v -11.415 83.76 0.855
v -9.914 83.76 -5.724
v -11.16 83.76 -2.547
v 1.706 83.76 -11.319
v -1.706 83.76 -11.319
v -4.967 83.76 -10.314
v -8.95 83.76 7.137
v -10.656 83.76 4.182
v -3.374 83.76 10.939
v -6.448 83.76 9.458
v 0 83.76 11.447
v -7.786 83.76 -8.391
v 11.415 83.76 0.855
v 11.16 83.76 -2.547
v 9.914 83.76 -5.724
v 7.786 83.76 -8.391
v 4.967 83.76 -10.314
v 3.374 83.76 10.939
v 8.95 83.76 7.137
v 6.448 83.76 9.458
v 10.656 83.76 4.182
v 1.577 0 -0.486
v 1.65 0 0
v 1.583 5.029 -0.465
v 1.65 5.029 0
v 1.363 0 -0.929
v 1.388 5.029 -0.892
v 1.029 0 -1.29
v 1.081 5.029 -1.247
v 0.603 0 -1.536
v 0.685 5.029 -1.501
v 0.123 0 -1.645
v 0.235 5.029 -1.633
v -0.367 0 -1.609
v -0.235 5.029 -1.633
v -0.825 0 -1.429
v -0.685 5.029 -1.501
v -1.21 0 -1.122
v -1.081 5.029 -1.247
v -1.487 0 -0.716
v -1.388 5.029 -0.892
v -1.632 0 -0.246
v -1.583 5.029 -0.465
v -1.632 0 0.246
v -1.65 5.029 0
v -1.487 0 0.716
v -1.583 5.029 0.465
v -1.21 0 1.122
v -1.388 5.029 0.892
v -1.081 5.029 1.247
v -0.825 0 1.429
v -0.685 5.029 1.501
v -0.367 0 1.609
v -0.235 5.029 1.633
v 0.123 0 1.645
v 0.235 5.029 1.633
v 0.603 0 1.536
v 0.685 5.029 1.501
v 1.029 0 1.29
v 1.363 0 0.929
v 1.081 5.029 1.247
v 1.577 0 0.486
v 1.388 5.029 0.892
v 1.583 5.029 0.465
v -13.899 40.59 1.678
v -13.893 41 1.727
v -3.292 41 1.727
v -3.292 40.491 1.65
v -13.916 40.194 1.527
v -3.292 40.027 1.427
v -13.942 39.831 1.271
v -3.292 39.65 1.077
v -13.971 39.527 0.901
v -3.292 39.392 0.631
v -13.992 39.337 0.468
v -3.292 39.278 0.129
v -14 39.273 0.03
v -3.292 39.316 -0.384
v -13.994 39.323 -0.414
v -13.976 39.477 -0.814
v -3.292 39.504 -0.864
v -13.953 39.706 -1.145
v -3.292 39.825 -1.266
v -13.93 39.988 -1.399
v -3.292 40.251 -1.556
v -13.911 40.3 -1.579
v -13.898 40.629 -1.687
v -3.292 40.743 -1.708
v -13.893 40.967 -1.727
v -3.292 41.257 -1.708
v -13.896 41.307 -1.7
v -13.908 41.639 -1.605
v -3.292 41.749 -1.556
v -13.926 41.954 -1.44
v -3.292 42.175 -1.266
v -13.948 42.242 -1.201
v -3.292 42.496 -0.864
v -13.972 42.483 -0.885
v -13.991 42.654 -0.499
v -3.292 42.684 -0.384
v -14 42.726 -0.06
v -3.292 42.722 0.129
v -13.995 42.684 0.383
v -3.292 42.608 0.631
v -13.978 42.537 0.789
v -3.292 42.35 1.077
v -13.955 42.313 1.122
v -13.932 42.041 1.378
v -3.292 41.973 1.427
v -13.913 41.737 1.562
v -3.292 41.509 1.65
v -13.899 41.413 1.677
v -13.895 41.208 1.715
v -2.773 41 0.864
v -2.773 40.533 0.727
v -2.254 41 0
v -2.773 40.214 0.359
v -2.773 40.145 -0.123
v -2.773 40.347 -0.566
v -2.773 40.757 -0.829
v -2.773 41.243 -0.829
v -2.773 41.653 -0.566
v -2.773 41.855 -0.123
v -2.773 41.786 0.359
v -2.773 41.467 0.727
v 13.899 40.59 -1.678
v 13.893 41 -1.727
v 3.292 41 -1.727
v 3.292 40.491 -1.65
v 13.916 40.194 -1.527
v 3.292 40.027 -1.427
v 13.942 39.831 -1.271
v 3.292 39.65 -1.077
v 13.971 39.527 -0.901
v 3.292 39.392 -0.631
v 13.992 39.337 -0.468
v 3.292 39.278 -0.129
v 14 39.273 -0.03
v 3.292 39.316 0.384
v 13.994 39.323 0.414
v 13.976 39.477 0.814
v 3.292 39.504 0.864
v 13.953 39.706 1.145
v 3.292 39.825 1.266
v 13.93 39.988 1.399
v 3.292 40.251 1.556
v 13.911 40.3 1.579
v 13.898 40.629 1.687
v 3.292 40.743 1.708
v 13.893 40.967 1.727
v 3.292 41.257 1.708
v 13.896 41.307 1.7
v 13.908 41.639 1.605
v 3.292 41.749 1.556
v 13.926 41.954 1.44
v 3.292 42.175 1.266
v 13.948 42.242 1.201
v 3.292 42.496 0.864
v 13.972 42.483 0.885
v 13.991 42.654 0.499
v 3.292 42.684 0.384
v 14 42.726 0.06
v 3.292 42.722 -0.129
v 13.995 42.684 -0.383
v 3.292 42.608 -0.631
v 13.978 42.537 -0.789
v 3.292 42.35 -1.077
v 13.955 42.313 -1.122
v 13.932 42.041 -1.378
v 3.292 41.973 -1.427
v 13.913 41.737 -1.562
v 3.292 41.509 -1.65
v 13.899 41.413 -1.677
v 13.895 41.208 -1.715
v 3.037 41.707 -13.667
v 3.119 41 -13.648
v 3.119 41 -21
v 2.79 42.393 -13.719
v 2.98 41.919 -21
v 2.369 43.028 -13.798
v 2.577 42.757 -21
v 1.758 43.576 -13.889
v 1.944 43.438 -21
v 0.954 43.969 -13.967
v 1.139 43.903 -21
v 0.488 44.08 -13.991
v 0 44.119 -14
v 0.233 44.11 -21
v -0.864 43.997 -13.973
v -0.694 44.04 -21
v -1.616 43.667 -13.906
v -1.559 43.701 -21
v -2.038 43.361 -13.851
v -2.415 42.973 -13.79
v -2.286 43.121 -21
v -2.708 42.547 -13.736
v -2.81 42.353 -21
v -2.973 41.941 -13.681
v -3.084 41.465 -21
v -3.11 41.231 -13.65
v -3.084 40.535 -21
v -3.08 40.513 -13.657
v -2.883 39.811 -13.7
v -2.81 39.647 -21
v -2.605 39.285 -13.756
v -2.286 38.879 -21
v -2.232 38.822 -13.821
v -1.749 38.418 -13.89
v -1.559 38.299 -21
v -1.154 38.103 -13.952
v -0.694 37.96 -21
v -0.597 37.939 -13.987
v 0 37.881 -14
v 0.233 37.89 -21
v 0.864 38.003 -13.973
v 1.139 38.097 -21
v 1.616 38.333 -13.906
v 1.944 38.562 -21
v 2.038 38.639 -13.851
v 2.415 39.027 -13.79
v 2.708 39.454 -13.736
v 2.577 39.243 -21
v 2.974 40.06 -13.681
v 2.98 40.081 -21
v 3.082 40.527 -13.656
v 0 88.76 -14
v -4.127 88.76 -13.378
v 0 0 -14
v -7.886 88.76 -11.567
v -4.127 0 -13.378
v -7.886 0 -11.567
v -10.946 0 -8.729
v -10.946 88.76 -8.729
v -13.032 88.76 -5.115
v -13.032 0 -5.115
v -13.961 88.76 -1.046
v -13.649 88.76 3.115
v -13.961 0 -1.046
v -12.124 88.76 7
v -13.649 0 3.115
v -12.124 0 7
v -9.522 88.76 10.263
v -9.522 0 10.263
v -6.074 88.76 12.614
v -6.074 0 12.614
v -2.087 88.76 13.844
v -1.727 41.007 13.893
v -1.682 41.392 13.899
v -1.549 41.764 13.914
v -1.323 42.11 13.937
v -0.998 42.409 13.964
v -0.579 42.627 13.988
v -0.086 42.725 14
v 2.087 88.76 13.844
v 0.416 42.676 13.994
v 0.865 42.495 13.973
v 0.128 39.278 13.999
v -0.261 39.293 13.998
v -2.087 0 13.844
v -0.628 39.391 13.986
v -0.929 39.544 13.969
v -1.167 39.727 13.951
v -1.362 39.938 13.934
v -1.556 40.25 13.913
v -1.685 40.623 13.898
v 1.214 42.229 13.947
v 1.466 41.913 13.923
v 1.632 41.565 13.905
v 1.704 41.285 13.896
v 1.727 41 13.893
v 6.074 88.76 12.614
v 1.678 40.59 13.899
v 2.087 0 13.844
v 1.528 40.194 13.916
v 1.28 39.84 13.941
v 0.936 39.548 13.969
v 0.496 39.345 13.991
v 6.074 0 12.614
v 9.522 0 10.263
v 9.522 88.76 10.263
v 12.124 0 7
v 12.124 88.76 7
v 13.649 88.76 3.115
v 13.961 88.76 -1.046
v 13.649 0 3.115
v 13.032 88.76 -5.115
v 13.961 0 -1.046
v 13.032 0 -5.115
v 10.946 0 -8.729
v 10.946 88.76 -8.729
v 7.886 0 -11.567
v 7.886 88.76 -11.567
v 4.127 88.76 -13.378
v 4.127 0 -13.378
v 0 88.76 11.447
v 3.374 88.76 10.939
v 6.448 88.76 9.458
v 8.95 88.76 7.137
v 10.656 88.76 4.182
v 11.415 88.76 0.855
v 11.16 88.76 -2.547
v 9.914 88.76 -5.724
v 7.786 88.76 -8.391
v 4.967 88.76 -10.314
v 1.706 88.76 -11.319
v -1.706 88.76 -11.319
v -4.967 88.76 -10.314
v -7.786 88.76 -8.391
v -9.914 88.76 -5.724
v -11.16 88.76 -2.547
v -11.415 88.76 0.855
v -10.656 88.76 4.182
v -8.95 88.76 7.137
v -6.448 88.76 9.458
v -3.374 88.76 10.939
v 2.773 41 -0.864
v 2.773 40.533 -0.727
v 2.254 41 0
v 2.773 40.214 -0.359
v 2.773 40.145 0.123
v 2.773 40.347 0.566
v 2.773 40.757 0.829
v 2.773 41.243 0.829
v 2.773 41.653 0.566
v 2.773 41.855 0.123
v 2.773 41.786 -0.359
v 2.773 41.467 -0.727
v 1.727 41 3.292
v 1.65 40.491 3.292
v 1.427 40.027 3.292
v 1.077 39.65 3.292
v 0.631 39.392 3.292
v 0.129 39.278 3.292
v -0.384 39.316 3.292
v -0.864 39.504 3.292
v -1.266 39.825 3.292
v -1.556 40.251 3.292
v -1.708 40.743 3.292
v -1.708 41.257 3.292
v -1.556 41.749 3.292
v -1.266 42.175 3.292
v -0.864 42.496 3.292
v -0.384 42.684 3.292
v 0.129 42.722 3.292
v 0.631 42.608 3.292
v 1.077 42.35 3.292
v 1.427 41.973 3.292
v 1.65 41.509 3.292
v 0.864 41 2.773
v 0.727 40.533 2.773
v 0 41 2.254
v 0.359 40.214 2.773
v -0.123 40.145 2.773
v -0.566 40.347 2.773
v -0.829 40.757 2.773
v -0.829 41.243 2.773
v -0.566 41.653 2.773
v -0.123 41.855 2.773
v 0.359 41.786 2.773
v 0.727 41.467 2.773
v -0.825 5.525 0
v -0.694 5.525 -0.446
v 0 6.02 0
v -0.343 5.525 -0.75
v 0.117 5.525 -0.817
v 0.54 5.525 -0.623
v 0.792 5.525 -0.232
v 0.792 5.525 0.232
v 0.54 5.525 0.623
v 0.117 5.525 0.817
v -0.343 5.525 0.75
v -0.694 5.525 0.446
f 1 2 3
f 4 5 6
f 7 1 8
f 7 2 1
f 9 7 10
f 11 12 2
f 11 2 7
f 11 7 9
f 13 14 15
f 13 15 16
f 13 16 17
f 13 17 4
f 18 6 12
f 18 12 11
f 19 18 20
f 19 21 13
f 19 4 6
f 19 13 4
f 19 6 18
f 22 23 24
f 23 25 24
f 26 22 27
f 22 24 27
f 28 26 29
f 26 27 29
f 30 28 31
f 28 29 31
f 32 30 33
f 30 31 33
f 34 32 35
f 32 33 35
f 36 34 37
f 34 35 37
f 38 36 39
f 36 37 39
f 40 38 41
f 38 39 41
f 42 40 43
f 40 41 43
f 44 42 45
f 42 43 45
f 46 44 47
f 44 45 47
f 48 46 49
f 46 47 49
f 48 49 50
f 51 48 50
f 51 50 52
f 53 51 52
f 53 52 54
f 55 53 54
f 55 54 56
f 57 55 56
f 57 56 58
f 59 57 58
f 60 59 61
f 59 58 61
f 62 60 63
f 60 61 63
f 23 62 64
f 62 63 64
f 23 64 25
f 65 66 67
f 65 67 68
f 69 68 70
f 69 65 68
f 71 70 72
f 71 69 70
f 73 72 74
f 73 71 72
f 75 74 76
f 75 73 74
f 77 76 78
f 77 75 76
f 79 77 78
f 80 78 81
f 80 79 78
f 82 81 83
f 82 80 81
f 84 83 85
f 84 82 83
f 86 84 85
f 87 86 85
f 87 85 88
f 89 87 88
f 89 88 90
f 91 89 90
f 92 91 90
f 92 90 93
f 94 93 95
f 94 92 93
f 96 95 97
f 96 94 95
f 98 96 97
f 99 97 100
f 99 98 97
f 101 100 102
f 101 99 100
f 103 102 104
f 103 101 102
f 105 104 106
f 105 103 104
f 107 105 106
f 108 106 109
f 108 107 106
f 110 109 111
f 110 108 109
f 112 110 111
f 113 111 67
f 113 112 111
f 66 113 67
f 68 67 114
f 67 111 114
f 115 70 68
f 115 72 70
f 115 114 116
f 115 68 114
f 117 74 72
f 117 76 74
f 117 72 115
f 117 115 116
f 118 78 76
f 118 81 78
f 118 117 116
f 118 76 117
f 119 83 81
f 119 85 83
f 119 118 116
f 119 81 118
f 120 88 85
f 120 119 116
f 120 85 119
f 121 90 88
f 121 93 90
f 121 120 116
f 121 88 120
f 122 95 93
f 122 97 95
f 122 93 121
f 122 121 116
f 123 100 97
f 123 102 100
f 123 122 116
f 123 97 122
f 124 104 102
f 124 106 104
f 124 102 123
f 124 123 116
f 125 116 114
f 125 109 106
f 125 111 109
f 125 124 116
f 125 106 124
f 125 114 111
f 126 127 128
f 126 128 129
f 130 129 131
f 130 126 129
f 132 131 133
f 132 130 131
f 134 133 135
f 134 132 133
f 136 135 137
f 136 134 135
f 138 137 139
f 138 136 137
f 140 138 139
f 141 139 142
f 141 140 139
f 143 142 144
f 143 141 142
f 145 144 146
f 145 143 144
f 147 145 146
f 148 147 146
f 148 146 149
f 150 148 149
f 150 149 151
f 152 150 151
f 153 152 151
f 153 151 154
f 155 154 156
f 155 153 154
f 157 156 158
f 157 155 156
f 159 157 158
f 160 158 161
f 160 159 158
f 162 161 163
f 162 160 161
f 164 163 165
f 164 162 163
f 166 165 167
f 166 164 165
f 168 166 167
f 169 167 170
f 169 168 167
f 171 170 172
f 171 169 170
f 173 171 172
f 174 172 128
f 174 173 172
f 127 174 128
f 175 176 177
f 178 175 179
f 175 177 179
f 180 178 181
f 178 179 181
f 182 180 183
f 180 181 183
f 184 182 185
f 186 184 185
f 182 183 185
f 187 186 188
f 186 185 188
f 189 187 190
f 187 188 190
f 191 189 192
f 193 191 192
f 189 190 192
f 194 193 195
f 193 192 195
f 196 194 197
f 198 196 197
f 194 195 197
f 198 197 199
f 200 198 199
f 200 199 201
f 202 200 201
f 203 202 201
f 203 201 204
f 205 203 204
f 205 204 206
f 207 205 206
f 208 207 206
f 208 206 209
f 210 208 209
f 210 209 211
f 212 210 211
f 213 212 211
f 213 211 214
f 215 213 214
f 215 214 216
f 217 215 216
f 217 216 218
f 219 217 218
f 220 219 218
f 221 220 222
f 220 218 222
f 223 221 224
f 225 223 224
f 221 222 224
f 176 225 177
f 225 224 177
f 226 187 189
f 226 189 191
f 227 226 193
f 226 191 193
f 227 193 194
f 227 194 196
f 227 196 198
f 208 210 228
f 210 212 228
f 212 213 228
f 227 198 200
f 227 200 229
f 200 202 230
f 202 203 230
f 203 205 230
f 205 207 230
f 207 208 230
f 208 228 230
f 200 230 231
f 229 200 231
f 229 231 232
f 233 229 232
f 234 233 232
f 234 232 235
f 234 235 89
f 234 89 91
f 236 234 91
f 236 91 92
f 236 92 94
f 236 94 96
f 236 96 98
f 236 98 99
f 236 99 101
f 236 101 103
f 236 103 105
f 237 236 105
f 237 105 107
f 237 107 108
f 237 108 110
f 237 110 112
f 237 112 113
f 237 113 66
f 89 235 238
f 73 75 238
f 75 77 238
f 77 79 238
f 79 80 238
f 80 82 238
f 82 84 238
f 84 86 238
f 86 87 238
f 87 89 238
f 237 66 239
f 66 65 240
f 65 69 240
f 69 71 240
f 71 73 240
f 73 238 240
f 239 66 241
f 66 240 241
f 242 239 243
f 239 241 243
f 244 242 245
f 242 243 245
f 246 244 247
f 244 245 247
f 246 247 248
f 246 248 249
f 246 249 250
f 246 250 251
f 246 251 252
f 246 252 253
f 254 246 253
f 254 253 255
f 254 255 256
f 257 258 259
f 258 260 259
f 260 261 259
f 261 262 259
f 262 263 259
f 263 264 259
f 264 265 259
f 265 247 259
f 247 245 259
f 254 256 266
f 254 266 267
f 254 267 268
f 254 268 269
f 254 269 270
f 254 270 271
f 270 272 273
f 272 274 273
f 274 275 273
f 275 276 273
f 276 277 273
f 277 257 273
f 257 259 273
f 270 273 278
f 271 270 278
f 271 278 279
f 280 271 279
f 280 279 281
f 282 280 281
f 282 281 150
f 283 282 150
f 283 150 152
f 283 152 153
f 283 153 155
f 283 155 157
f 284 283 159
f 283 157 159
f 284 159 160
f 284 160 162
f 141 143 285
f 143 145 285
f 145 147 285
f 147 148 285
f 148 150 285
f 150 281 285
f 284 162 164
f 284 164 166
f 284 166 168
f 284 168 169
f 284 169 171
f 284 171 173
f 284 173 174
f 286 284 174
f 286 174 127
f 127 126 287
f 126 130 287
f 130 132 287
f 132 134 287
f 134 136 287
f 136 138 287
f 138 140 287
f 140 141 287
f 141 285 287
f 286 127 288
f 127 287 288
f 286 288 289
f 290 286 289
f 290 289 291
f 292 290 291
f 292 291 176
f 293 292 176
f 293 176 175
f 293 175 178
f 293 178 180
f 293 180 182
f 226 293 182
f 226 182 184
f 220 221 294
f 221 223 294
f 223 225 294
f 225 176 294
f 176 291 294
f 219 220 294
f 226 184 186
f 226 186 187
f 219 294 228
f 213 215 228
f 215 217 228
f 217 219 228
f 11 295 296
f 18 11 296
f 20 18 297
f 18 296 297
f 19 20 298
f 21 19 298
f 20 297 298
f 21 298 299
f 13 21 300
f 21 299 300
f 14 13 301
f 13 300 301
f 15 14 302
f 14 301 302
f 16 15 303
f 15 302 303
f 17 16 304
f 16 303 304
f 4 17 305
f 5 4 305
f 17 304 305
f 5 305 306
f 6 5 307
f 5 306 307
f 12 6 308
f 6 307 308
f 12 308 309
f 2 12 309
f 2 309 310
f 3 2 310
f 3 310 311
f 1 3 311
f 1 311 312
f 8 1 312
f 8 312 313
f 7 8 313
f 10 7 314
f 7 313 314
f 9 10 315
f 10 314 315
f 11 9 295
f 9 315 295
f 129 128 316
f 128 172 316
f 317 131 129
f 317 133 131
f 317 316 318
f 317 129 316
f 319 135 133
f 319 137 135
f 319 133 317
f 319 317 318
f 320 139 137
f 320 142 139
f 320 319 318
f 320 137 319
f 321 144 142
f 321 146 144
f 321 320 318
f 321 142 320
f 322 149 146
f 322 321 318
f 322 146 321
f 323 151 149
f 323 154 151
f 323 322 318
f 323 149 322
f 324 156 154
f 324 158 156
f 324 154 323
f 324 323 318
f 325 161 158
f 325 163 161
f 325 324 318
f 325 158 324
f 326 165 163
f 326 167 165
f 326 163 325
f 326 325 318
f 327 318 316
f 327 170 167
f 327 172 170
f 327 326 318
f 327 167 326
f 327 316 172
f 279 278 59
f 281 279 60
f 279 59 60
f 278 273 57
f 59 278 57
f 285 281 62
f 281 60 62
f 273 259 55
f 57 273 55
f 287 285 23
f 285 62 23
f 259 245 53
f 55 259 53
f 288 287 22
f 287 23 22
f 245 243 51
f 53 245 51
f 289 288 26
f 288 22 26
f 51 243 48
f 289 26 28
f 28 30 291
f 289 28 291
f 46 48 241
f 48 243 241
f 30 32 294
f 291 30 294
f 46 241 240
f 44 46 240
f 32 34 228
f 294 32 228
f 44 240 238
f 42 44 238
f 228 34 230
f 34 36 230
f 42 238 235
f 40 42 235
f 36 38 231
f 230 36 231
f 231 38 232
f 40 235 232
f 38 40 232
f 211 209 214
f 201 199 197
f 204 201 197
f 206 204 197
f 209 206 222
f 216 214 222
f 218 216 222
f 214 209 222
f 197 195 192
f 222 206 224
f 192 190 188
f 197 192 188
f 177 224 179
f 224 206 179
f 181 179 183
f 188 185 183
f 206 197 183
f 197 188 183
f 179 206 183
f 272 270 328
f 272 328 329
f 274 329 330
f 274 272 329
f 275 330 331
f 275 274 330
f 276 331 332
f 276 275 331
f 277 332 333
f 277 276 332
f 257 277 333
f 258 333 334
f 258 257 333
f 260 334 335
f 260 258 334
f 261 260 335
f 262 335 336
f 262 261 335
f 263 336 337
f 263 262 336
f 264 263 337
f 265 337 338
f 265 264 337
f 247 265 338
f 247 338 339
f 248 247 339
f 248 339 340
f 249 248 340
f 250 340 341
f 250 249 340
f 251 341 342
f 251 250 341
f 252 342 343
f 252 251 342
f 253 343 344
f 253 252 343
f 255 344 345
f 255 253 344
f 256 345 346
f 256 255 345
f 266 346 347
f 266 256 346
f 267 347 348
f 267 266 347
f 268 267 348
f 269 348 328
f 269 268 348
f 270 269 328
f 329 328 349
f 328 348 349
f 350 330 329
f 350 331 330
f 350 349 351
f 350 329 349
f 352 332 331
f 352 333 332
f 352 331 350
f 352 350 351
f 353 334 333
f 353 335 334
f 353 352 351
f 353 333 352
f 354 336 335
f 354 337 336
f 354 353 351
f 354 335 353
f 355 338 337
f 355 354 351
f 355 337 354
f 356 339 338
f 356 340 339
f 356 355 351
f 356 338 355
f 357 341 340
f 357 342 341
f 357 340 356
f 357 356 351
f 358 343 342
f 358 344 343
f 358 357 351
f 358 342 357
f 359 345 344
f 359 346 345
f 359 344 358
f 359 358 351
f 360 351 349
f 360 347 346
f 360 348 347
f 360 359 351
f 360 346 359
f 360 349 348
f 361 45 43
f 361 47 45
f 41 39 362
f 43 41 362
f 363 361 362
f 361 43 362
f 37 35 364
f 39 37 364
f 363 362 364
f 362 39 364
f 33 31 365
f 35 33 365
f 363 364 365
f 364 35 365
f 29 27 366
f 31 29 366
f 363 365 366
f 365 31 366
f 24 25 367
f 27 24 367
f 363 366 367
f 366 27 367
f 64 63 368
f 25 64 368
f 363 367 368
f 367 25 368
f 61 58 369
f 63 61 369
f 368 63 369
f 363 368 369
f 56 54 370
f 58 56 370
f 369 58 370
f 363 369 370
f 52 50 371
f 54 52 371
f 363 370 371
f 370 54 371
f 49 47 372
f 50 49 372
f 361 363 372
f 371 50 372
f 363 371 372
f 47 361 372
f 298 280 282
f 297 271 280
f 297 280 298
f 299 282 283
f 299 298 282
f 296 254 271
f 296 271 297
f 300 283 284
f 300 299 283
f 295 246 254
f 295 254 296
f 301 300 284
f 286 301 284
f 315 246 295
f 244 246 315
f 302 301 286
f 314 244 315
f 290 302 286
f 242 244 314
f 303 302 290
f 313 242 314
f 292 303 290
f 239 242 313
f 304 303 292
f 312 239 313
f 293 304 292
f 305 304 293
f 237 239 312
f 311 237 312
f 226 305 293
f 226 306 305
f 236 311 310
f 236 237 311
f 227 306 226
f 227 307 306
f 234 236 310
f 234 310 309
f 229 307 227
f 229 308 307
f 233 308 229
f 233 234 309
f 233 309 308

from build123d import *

# Parameters (mm, degrees)
SKETCH1_R                 = 14
EXTRUDE1_DEPTH            = 88.76
M4X0_7_TAPPED_HOLE1_D     = 3.3
M4X0_7_TAPPED_HOLE1_DEPTH = 5.029
M4X0_7_TAPPED_HOLE1_TIP   = 0.991420021
CIRPATTERN1_COUNT         = 3
CIRPATTERN1_ANGLE         = 180
SKETCH6_R                 = 11.447205948
EXTRUDE2_DEPTH            = 5
EXTRUDE3_DEPTH            = 1
EXTRUDE3_DEPTH_BACK       = 7
SKETCH7_R                 = 3.118608258


with BuildPart() as part:
    # Sketch1 → Extrude1 (new body)
    with BuildSketch(Plane(origin=(0, 0, 0), x_dir=(1, 0, 0), z_dir=(0, 1, 0))):
        Circle(SKETCH1_R)
    extrude(amount=EXTRUDE1_DEPTH)

    # M4x0.7 Tapped Hole1
    with Locations(Plane(origin=(-1.120603621, 0, -3.903834828), x_dir=(-1, 0, 0), z_dir=(0, -1, 0))):
        with Locations((-1.120603621, -3.903834828)):
            Hole(M4X0_7_TAPPED_HOLE1_D / 2, depth=M4X0_7_TAPPED_HOLE1_DEPTH)
            with Locations((0, 0, -(M4X0_7_TAPPED_HOLE1_DEPTH + M4X0_7_TAPPED_HOLE1_TIP / 2))):  # 118° drill point
                Cone(0, M4X0_7_TAPPED_HOLE1_D / 2, M4X0_7_TAPPED_HOLE1_TIP, mode=Mode.SUBTRACT)

    # Sketch4 → #8-32 Tapped Hole1 (revolve, cut)
    with BuildSketch(Plane(origin=(-14, 41, 0), x_dir=(0, 0, 1), z_dir=(0, 1, 0))):
        Polygon((0, 0), (0, 11.745806461), (1.7272, 10.708), (1.7272, 0), align=None)
    f_8_32_tapped_hole1 = revolve(axis=Axis((-20.35, 41, 0), (1, 0, 0)), mode=Mode.SUBTRACT)

    # CirPattern1: #8-32 Tapped Hole1 ×3 about axis
    cirpattern1_axis = Axis((0, 0, 0), (0, 1, 0))
    for i in range(1, CIRPATTERN1_COUNT):
        add(f_8_32_tapped_hole1.rotate(cirpattern1_axis, i * CIRPATTERN1_ANGLE / (CIRPATTERN1_COUNT - 1)), mode=Mode.SUBTRACT)

    # Sketch6 → Extrude2 (cut)
    with BuildSketch(Plane(origin=(0, 88.76, 0), x_dir=(1, 0, 0), z_dir=(0, 1, 0))):
        Circle(SKETCH6_R)
    extrude(amount=-EXTRUDE2_DEPTH, mode=Mode.SUBTRACT)

    # Sketch7 → Extrude3 (add, two sides: drawn at the far end of the back side and taken through both)
    with BuildSketch(Plane.XY.offset(-14).offset(-EXTRUDE3_DEPTH_BACK)):
        with Locations((0, 41)):
            Circle(SKETCH7_R)
    extrude(amount=EXTRUDE3_DEPTH + EXTRUDE3_DEPTH_BACK)


solid = part.part
